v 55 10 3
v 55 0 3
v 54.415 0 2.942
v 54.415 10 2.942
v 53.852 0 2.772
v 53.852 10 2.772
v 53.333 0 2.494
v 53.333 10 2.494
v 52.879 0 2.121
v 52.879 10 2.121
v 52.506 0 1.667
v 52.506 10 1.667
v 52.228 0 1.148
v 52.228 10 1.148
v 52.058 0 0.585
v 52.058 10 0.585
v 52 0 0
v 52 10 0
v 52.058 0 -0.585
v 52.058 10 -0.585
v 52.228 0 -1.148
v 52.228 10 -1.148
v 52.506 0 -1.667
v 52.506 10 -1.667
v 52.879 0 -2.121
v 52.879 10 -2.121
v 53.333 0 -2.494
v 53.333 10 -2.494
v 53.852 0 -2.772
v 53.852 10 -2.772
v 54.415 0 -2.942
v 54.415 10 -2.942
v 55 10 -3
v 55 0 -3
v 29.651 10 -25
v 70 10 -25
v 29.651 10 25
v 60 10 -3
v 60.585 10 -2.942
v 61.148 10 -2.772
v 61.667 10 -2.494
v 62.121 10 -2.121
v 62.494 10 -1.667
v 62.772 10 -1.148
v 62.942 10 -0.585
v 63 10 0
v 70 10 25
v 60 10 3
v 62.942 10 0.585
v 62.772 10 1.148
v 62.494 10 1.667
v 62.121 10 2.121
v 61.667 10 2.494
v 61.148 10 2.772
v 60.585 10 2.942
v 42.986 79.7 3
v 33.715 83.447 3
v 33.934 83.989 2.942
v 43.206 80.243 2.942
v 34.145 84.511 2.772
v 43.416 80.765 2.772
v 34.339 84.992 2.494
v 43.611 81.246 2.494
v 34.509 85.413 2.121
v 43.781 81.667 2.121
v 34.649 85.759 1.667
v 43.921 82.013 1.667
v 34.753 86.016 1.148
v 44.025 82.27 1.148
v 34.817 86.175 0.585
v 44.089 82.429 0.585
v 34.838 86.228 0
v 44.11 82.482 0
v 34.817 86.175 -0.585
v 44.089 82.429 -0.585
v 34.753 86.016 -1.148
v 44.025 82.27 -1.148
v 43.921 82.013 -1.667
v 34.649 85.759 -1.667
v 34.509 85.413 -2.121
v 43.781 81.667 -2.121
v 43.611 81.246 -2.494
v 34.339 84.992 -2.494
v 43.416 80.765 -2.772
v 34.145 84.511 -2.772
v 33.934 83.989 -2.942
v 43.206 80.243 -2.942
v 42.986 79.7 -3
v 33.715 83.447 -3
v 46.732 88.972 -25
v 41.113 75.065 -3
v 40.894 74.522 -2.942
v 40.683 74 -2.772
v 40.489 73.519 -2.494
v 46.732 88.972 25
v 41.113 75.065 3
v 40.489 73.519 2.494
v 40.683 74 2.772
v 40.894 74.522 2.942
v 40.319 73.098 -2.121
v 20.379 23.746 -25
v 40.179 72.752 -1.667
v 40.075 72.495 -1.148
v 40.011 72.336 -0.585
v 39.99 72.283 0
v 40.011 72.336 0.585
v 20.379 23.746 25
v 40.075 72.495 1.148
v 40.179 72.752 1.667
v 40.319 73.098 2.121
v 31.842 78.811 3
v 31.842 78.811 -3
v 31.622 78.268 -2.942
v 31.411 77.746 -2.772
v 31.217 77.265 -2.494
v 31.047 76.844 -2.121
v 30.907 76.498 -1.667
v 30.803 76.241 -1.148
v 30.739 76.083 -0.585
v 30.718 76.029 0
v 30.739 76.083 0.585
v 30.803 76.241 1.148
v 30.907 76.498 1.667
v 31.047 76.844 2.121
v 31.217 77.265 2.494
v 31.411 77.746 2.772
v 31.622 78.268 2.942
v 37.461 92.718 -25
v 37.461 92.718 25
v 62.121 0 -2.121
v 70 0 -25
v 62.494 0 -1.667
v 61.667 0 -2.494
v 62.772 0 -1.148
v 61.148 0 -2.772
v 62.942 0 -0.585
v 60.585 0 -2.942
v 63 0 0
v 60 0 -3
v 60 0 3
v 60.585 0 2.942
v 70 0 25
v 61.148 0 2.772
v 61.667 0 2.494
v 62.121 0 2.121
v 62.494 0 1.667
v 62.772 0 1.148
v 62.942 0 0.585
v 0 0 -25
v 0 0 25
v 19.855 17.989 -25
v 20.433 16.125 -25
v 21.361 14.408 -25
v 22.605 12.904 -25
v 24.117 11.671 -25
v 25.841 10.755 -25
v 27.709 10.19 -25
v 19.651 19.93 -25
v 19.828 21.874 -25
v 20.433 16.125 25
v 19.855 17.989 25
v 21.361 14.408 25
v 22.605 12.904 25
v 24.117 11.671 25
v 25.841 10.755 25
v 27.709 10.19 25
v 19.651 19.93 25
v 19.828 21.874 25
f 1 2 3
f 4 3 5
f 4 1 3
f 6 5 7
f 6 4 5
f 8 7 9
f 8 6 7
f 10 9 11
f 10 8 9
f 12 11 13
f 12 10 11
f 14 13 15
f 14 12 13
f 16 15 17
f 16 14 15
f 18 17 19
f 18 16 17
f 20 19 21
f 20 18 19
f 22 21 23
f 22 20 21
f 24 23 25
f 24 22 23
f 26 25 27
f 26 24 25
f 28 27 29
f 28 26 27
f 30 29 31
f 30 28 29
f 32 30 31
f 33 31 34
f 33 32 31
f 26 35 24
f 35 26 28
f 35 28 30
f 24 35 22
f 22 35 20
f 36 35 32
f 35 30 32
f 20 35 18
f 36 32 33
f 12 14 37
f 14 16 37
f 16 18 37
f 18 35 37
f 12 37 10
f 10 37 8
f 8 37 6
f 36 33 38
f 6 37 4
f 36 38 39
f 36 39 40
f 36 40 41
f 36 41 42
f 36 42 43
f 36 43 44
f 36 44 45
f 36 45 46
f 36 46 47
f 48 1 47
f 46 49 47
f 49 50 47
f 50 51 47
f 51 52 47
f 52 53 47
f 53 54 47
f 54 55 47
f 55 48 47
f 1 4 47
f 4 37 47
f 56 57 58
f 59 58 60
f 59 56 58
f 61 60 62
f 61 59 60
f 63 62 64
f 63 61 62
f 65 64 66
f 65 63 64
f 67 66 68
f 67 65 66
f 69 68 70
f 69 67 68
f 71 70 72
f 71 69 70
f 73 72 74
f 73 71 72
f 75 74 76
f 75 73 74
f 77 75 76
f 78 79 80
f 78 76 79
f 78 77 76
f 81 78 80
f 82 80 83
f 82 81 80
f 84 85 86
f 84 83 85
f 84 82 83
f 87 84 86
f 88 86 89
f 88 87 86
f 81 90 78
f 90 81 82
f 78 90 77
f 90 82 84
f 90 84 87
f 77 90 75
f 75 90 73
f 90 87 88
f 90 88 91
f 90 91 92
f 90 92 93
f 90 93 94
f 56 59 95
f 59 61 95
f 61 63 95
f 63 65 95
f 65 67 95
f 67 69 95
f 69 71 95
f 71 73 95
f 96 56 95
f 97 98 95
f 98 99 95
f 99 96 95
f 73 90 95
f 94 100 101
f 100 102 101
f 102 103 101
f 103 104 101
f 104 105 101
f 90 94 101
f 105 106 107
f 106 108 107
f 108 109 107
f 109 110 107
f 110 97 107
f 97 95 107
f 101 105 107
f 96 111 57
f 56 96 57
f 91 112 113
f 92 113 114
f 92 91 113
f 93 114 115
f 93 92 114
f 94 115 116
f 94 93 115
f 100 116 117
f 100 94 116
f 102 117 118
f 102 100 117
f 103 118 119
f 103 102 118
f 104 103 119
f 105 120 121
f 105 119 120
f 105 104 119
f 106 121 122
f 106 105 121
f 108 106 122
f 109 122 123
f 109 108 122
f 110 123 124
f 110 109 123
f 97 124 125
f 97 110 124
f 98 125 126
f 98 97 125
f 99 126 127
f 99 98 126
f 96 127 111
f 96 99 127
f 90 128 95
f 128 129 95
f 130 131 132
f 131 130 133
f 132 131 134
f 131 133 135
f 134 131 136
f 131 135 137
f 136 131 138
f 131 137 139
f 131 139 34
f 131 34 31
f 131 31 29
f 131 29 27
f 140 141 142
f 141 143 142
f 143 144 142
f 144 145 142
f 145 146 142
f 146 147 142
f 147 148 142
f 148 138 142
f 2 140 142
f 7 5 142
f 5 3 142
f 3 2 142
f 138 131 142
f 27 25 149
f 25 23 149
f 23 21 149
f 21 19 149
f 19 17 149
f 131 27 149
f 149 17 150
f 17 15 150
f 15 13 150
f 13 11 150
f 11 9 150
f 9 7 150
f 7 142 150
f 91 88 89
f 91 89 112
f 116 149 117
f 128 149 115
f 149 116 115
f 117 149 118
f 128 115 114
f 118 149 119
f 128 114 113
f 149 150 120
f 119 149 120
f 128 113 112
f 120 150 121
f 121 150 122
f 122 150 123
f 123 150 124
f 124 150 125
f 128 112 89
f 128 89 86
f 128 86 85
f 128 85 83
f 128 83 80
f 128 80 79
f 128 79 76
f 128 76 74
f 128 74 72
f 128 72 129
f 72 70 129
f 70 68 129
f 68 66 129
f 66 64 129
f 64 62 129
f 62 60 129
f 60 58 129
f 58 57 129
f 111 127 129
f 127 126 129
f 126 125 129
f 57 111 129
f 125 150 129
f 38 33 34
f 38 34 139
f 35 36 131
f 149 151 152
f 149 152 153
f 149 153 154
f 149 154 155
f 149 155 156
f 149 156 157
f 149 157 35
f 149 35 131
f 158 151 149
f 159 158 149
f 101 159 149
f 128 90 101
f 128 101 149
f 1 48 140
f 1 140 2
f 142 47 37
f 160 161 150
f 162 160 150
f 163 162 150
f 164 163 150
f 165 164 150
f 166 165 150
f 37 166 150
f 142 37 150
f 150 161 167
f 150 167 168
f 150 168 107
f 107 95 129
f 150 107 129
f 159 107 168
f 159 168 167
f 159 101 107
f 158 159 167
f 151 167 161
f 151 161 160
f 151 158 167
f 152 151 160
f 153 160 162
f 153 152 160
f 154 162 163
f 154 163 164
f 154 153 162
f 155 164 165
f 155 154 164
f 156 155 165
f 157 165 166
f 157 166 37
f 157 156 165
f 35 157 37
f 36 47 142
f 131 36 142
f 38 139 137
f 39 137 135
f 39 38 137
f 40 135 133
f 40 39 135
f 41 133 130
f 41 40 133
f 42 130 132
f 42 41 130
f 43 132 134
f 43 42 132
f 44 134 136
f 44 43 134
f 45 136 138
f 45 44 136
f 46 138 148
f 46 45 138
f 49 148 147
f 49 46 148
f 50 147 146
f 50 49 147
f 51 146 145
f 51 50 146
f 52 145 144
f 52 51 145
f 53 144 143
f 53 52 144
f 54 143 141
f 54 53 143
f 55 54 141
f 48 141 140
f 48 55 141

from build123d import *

# Parameters (mm, degrees)
BOSS_EXTRUDE1_DEPTH = 25
CUT_EXTRUDE1_DEPTH  = 112.208503688
CUT_EXTRUDE2_DEPTH  = 117.69747202
FILLET2_R           = 10


with BuildPart() as part:
    # Sketch1 → Boss-Extrude1 (new, symmetric)
    with BuildSketch(Plane.XY):
        Polygon((0, 0), (37.460659342, 92.718385457), (46.732497887, 88.972319523), (14.825609685, 10), (70, 10), (70, 0), align=None)
    extrude(amount=BOSS_EXTRUDE1_DEPTH, both=True)

    # Sketch2 → Cut-Extrude1 (cut, through all)
    with BuildSketch(Plane(origin=(0, 10, 0), x_dir=(1, 0, 0), z_dir=(0, 1, 0))):
        with BuildLine():
            Line((60, -3), (55, -3))
            ThreePointArc((55, -3), (52, 0), (55, 3))
            Line((55, 3), (60, 3))
            ThreePointArc((60, 3), (63, 0), (60, -3))
        make_face()
    extrude(amount=-CUT_EXTRUDE1_DEPTH, mode=Mode.SUBTRACT)

    # Sketch3 → Cut-Extrude2 (cut, through all)
    with BuildSketch(Plane(origin=(9.271838546, -3.746065934, 0), x_dir=(0, 0, -1), z_dir=(0.9271838545667856, -0.3746065934159163, 0))):
        with BuildLine():
            Line((3, 90), (3, 85))
            ThreePointArc((3, 85), (0, 82), (-3, 85))
            Line((-3, 85), (-3, 90))
            ThreePointArc((-3, 90), (0, 93), (3, 90))
        make_face()
    extrude(amount=-CUT_EXTRUDE2_DEPTH, mode=Mode.SUBTRACT)

    # Fillet2
    fillet2_edges = [part.edges().sort_by_distance(p)[0] for p in [
        (14.825609685, 10, 0),
    ]]
    fillet(fillet2_edges, radius=FILLET2_R)


solid = part.part
